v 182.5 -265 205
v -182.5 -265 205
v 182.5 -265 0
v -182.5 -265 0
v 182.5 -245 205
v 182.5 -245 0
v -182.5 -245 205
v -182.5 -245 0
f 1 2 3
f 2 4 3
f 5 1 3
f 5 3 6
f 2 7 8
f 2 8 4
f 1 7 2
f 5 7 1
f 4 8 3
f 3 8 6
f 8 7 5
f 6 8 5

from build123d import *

# Parameters (mm, degrees)
F0_W     = 365
F0_H     = 530
F1_DEPTH = 10
F2_W     = 325
F2_H     = 20
F3_DEPTH = 195
F4_W     = 365
F4_H     = 510
F5_DEPTH = 205.001


with BuildPart() as f1:
    # F0 (on Top) → F1 (new body)
    with BuildSketch(Plane.XY):
        Rectangle(F0_W, F0_H)
    extrude(amount=F1_DEPTH)

    # F2 (on face) → F3 (join)
    with BuildSketch(Plane.XY.offset(10)):
        Polygon((-162.5, 265), (-182.5, 265), (-182.5, -265), (-162.5, -265), (-162.5, -245), (-162.5, 245), align=None)
        with Locations((0, 255)):
            Rectangle(F2_W, F2_H)
        Polygon((182.5, 265), (162.5, 265), (162.5, 245), (162.5, -245), (162.5, -265), (182.5, -265), align=None)
        with Locations((0, -255)):
            Rectangle(F2_W, F2_H)
    extrude(amount=F3_DEPTH)

    # F4 (on face) → F5 (cut, through all)
    with BuildSketch(Plane.XY.offset(205)):
        with Locations((0, 10)):
            Rectangle(F4_W, F4_H)
        Polygon((182.5, 265), (-182.5, 265), (-182.5, -245), (-162.5, -245), (182.5, -245), align=None)
    extrude(amount=-F5_DEPTH, mode=Mode.SUBTRACT)


solid = f1.part
